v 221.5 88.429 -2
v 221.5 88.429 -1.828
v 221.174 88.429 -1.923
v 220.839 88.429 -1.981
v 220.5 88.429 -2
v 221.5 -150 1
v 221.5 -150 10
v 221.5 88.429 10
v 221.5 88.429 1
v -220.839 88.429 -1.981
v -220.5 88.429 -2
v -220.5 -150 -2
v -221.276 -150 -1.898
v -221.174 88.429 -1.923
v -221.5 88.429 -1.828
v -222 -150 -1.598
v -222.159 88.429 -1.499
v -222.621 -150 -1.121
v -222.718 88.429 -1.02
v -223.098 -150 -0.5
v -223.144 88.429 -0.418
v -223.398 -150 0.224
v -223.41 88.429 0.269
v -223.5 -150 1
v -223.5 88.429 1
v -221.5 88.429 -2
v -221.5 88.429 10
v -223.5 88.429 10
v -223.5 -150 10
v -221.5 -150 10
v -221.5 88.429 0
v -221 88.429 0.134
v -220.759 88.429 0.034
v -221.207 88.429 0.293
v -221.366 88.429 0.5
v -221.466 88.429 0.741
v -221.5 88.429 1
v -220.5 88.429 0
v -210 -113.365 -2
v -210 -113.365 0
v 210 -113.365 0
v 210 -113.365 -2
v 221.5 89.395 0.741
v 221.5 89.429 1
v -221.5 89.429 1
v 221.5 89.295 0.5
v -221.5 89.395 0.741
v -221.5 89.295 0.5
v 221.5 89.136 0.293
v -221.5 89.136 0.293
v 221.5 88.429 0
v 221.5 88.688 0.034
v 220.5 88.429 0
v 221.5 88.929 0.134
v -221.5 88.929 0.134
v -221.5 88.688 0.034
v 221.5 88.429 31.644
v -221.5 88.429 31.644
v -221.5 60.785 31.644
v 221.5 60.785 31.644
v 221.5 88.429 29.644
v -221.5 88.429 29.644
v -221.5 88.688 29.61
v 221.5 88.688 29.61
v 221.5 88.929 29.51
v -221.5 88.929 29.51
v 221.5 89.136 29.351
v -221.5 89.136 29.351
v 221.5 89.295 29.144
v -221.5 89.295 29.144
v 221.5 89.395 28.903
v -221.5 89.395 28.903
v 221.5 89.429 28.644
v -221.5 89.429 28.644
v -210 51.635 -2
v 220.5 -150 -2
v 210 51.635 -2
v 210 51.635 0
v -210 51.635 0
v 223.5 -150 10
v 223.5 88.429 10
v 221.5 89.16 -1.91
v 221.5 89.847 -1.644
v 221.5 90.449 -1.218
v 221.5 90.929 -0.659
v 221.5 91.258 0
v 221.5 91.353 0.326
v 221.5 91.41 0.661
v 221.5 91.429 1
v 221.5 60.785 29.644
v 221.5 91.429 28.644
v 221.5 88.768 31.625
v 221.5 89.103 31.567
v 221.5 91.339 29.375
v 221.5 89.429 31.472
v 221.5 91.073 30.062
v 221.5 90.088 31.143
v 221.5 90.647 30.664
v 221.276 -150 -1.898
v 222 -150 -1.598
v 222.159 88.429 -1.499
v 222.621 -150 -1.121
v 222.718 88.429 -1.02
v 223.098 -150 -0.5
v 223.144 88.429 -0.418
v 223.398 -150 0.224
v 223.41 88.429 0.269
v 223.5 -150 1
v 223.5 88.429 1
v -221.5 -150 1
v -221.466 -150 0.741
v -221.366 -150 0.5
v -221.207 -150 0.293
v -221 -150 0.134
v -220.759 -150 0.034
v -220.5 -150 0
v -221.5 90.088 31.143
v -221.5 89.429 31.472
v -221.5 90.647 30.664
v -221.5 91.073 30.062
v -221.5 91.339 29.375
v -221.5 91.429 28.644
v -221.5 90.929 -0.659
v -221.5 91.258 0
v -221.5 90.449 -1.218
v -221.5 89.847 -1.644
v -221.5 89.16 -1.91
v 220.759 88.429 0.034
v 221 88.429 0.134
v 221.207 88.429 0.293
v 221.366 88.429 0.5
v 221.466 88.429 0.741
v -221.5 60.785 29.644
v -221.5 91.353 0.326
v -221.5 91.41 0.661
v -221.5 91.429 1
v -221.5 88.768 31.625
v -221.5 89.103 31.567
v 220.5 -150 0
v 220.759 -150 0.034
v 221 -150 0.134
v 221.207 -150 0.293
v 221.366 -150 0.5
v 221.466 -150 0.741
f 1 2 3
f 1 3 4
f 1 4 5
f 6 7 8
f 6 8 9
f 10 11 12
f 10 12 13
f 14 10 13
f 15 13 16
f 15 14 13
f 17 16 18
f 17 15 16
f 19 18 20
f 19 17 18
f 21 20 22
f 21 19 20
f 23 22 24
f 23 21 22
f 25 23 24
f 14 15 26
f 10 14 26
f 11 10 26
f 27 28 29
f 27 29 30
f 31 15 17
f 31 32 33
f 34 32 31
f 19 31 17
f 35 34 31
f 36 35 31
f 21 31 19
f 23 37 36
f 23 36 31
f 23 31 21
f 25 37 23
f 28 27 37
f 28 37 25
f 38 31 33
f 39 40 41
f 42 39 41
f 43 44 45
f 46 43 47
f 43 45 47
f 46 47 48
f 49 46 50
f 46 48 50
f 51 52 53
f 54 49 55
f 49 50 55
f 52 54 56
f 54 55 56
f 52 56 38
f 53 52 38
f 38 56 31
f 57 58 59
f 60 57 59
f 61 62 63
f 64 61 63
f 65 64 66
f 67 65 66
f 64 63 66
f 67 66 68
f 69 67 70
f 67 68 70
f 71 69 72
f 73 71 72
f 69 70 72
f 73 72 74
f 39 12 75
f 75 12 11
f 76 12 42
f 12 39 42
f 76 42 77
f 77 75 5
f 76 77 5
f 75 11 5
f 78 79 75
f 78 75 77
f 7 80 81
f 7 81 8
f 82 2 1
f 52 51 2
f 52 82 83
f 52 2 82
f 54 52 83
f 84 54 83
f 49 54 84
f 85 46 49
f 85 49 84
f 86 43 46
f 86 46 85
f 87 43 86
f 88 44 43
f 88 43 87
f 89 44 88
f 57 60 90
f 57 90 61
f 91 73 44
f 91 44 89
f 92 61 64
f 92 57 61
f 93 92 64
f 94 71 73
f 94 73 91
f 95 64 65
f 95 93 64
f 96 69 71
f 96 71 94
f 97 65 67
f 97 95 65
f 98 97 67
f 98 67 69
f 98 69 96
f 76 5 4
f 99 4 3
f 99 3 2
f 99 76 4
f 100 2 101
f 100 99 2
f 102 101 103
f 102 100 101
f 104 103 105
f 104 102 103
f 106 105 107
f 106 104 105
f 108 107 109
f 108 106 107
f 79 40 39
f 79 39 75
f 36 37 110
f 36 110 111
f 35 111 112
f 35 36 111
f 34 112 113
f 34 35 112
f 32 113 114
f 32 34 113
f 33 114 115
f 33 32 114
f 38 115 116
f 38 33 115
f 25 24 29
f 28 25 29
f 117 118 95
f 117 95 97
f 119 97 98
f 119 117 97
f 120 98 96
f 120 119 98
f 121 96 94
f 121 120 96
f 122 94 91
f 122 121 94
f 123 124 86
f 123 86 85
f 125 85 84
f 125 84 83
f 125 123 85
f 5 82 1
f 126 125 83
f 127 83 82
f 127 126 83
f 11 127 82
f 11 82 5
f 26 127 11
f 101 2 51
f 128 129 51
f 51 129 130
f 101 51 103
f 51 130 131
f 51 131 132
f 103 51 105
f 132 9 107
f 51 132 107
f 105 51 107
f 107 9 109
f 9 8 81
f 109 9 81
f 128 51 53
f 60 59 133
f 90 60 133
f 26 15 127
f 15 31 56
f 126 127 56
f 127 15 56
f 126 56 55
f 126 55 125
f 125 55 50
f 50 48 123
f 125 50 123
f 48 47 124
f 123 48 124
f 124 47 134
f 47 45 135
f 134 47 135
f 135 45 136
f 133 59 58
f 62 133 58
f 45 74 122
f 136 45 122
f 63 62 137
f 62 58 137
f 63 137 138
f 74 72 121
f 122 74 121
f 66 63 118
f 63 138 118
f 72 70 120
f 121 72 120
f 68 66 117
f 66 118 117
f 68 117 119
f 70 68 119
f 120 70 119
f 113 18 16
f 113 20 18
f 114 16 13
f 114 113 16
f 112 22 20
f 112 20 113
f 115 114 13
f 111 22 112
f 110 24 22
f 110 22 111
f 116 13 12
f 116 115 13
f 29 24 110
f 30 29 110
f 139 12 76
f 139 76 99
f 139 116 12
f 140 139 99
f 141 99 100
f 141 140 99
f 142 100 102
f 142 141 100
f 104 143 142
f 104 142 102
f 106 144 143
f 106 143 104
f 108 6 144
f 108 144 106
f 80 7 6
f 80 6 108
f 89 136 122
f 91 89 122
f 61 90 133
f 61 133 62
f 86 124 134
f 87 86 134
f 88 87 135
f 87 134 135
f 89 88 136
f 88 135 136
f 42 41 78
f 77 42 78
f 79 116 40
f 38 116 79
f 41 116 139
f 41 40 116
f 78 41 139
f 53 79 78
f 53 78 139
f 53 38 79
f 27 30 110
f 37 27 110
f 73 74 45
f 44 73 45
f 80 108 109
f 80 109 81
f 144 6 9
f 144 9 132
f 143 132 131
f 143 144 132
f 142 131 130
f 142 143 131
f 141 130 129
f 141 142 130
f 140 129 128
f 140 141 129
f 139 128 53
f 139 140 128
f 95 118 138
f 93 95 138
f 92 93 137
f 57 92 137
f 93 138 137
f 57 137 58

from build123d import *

# Parameters (mm, degrees)
SKETCH1_W                    = 443
SKETCH1_H                    = 300
BASE_FLANGE1_DEPTH           = 2
SKETCHED_START               = -221.5
SKETCHED_BEND1_DEPTH         = 443
SKETCHED_BEND1_2_DEPTH       = 443
SKETCHED_BEND2_DEPTH         = 443
SKETCHED_BEND2_2_DEPTH       = 443
EDGE_FLANGE1_STRIP_W         = 10
EDGE_FLANGE1_STRIP_H         = 2
EDGE_FLANGE1_STRIP_CUT_DEPTH = 238.429203673
EDGE_FLANGE1_DEPTH           = 238.429203673
EDGE_FLANGE2_STRIP_W         = 10
EDGE_FLANGE2_STRIP_H         = 2
EDGE_FLANGE2_STRIP_CUT_DEPTH = 238.429203673
EDGE_FLANGE2_DEPTH           = 238.429203673
SKETCH15_W                   = 420
SKETCH15_H                   = 165
CUT_EXTRUDE1_DEPTH           = 272.023210126


# Read off the part's stored shape, not the designer's step: Sketched Bend1, Sketched Bend2
# Sheet-metal steps are written as plain solids
with BuildPart() as part:
    # Sketch1 → Base-Flange1 (new body)
    with BuildSketch(Plane.XY):
        Rectangle(SKETCH1_W, SKETCH1_H)
    extrude(amount=-BASE_FLANGE1_DEPTH)

    # Sketched Bend1 outline → Sketched Bend1 (cut)
    with BuildSketch(Plane.YZ.offset(SKETCHED_START)):
        with BuildLine():
            Line((150, 0), (91.257630798, 0))
            ThreePointArc((91.257630798, 0), (90.161254481, -1.449489743), (88.429203673, -2))
            Line((88.429203673, -2), (150, -2))
            Line((150, -2), (150, 0))
        make_face()
    extrude(amount=SKETCHED_BEND1_DEPTH, mode=Mode.SUBTRACT)

    # Sketched Bend1 2 outline → Sketched Bend1 2 (add)
    with BuildSketch(Plane.YZ.offset(SKETCHED_START)):
        with BuildLine():
            Line((91.429203673, 1), (91.429203673, 59.429203673))
            Line((91.429203673, 59.429203673), (89.429203673, 59.429203673))
            Line((89.429203673, 59.429203673), (89.429203673, 1))
            ThreePointArc((89.429203673, 1), (89.136310454, 0.292893219), (88.429203673, 0))
            Line((88.429203673, 0), (91.257630798, 0))
            ThreePointArc((91.257630798, 0), (91.385999352, 0.492694064), (91.429203673, 1))
        make_face()
    extrude(amount=SKETCHED_BEND1_2_DEPTH)

    # Sketched Bend2 outline → Sketched Bend2 (cut)
    with BuildSketch(Plane.YZ.offset(SKETCHED_START)):
        with BuildLine():
            ThreePointArc((89.429203673, 31.472232635), (90.878693416, 30.375856318), (91.429203673, 28.64380551))
            Line((91.429203673, 28.64380551), (91.429203673, 59.429203673))
            Line((91.429203673, 59.429203673), (89.429203673, 59.429203673))
            Line((89.429203673, 59.429203673), (89.429203673, 31.472232635))
        make_face()
    extrude(amount=SKETCHED_BEND2_DEPTH, mode=Mode.SUBTRACT)

    # Sketched Bend2 2 outline → Sketched Bend2 2 (add)
    with BuildSketch(Plane.YZ.offset(SKETCHED_START)):
        with BuildLine():
            Line((89.429203673, 28.64380551), (89.429203673, 31.472232635))
            ThreePointArc((89.429203673, 31.472232635), (88.936509609, 31.600601189), (88.429203673, 31.64380551))
            Line((88.429203673, 31.64380551), (60.785398163, 31.64380551))
            Line((60.785398163, 31.64380551), (60.785398163, 29.64380551))
            Line((60.785398163, 29.64380551), (88.429203673, 29.64380551))
            ThreePointArc((88.429203673, 29.64380551), (89.136310454, 29.350912291), (89.429203673, 28.64380551))
        make_face()
    extrude(amount=SKETCHED_BEND2_2_DEPTH)

    # Edge-Flange1 strip (across the edge) → Edge-Flange1 strip cut (cut)
    with BuildSketch(Plane(origin=(-221.5, 88.429203673, 0), x_dir=(1, 0, 0), z_dir=(0, -1, 0))):
        with Locations((-4, -1)):
            Rectangle(EDGE_FLANGE1_STRIP_W, EDGE_FLANGE1_STRIP_H)
    extrude(amount=EDGE_FLANGE1_STRIP_CUT_DEPTH, mode=Mode.SUBTRACT)

    # Edge-Flange1 section (across the edge) → Edge-Flange1 (add)
    with BuildSketch(Plane(origin=(-221.5, 88.429203673, 0), x_dir=(1, 0, 0), z_dir=(0, -1, 0))):
        with BuildLine():
            Line((-2, 1), (-2, 10))
            Line((-2, 10), (0, 10))
            Line((0, 10), (0, 1))
            ThreePointArc((0, 1), (0.292893219, 0.292893219), (1, 0))
            Line((1, 0), (1, -2))
            ThreePointArc((1, -2), (-1.121320344, -1.121320344), (-2, 1))
        make_face()
    extrude(amount=EDGE_FLANGE1_DEPTH)

    # Edge-Flange2 strip (across the edge) → Edge-Flange2 strip cut (cut)
    with BuildSketch(Plane(origin=(221.5, -150, 0), x_dir=(-1, 0, 0), z_dir=(0, 1, 0))):
        with Locations((-4, -1)):
            Rectangle(EDGE_FLANGE2_STRIP_W, EDGE_FLANGE2_STRIP_H)
    extrude(amount=EDGE_FLANGE2_STRIP_CUT_DEPTH, mode=Mode.SUBTRACT)

    # Edge-Flange2 section (across the edge) → Edge-Flange2 (add)
    with BuildSketch(Plane(origin=(221.5, -150, 0), x_dir=(-1, 0, 0), z_dir=(0, 1, 0))):
        with BuildLine():
            Line((-2, 1), (-2, 10))
            Line((-2, 10), (0, 10))
            Line((0, 10), (0, 1))
            ThreePointArc((0, 1), (0.292893219, 0.292893219), (1, 0))
            Line((1, 0), (1, -2))
            ThreePointArc((1, -2), (-1.121320344, -1.121320344), (-2, 1))
        make_face()
    extrude(amount=EDGE_FLANGE2_DEPTH)

    # Sketch15 → Cut-Extrude1 (cut, through all)
    with BuildSketch(Plane.XY):
        with Locations((0, -30.864518484)):
            Rectangle(SKETCH15_W, SKETCH15_H)
    extrude(amount=-CUT_EXTRUDE1_DEPTH, mode=Mode.SUBTRACT)


solid = part.part
